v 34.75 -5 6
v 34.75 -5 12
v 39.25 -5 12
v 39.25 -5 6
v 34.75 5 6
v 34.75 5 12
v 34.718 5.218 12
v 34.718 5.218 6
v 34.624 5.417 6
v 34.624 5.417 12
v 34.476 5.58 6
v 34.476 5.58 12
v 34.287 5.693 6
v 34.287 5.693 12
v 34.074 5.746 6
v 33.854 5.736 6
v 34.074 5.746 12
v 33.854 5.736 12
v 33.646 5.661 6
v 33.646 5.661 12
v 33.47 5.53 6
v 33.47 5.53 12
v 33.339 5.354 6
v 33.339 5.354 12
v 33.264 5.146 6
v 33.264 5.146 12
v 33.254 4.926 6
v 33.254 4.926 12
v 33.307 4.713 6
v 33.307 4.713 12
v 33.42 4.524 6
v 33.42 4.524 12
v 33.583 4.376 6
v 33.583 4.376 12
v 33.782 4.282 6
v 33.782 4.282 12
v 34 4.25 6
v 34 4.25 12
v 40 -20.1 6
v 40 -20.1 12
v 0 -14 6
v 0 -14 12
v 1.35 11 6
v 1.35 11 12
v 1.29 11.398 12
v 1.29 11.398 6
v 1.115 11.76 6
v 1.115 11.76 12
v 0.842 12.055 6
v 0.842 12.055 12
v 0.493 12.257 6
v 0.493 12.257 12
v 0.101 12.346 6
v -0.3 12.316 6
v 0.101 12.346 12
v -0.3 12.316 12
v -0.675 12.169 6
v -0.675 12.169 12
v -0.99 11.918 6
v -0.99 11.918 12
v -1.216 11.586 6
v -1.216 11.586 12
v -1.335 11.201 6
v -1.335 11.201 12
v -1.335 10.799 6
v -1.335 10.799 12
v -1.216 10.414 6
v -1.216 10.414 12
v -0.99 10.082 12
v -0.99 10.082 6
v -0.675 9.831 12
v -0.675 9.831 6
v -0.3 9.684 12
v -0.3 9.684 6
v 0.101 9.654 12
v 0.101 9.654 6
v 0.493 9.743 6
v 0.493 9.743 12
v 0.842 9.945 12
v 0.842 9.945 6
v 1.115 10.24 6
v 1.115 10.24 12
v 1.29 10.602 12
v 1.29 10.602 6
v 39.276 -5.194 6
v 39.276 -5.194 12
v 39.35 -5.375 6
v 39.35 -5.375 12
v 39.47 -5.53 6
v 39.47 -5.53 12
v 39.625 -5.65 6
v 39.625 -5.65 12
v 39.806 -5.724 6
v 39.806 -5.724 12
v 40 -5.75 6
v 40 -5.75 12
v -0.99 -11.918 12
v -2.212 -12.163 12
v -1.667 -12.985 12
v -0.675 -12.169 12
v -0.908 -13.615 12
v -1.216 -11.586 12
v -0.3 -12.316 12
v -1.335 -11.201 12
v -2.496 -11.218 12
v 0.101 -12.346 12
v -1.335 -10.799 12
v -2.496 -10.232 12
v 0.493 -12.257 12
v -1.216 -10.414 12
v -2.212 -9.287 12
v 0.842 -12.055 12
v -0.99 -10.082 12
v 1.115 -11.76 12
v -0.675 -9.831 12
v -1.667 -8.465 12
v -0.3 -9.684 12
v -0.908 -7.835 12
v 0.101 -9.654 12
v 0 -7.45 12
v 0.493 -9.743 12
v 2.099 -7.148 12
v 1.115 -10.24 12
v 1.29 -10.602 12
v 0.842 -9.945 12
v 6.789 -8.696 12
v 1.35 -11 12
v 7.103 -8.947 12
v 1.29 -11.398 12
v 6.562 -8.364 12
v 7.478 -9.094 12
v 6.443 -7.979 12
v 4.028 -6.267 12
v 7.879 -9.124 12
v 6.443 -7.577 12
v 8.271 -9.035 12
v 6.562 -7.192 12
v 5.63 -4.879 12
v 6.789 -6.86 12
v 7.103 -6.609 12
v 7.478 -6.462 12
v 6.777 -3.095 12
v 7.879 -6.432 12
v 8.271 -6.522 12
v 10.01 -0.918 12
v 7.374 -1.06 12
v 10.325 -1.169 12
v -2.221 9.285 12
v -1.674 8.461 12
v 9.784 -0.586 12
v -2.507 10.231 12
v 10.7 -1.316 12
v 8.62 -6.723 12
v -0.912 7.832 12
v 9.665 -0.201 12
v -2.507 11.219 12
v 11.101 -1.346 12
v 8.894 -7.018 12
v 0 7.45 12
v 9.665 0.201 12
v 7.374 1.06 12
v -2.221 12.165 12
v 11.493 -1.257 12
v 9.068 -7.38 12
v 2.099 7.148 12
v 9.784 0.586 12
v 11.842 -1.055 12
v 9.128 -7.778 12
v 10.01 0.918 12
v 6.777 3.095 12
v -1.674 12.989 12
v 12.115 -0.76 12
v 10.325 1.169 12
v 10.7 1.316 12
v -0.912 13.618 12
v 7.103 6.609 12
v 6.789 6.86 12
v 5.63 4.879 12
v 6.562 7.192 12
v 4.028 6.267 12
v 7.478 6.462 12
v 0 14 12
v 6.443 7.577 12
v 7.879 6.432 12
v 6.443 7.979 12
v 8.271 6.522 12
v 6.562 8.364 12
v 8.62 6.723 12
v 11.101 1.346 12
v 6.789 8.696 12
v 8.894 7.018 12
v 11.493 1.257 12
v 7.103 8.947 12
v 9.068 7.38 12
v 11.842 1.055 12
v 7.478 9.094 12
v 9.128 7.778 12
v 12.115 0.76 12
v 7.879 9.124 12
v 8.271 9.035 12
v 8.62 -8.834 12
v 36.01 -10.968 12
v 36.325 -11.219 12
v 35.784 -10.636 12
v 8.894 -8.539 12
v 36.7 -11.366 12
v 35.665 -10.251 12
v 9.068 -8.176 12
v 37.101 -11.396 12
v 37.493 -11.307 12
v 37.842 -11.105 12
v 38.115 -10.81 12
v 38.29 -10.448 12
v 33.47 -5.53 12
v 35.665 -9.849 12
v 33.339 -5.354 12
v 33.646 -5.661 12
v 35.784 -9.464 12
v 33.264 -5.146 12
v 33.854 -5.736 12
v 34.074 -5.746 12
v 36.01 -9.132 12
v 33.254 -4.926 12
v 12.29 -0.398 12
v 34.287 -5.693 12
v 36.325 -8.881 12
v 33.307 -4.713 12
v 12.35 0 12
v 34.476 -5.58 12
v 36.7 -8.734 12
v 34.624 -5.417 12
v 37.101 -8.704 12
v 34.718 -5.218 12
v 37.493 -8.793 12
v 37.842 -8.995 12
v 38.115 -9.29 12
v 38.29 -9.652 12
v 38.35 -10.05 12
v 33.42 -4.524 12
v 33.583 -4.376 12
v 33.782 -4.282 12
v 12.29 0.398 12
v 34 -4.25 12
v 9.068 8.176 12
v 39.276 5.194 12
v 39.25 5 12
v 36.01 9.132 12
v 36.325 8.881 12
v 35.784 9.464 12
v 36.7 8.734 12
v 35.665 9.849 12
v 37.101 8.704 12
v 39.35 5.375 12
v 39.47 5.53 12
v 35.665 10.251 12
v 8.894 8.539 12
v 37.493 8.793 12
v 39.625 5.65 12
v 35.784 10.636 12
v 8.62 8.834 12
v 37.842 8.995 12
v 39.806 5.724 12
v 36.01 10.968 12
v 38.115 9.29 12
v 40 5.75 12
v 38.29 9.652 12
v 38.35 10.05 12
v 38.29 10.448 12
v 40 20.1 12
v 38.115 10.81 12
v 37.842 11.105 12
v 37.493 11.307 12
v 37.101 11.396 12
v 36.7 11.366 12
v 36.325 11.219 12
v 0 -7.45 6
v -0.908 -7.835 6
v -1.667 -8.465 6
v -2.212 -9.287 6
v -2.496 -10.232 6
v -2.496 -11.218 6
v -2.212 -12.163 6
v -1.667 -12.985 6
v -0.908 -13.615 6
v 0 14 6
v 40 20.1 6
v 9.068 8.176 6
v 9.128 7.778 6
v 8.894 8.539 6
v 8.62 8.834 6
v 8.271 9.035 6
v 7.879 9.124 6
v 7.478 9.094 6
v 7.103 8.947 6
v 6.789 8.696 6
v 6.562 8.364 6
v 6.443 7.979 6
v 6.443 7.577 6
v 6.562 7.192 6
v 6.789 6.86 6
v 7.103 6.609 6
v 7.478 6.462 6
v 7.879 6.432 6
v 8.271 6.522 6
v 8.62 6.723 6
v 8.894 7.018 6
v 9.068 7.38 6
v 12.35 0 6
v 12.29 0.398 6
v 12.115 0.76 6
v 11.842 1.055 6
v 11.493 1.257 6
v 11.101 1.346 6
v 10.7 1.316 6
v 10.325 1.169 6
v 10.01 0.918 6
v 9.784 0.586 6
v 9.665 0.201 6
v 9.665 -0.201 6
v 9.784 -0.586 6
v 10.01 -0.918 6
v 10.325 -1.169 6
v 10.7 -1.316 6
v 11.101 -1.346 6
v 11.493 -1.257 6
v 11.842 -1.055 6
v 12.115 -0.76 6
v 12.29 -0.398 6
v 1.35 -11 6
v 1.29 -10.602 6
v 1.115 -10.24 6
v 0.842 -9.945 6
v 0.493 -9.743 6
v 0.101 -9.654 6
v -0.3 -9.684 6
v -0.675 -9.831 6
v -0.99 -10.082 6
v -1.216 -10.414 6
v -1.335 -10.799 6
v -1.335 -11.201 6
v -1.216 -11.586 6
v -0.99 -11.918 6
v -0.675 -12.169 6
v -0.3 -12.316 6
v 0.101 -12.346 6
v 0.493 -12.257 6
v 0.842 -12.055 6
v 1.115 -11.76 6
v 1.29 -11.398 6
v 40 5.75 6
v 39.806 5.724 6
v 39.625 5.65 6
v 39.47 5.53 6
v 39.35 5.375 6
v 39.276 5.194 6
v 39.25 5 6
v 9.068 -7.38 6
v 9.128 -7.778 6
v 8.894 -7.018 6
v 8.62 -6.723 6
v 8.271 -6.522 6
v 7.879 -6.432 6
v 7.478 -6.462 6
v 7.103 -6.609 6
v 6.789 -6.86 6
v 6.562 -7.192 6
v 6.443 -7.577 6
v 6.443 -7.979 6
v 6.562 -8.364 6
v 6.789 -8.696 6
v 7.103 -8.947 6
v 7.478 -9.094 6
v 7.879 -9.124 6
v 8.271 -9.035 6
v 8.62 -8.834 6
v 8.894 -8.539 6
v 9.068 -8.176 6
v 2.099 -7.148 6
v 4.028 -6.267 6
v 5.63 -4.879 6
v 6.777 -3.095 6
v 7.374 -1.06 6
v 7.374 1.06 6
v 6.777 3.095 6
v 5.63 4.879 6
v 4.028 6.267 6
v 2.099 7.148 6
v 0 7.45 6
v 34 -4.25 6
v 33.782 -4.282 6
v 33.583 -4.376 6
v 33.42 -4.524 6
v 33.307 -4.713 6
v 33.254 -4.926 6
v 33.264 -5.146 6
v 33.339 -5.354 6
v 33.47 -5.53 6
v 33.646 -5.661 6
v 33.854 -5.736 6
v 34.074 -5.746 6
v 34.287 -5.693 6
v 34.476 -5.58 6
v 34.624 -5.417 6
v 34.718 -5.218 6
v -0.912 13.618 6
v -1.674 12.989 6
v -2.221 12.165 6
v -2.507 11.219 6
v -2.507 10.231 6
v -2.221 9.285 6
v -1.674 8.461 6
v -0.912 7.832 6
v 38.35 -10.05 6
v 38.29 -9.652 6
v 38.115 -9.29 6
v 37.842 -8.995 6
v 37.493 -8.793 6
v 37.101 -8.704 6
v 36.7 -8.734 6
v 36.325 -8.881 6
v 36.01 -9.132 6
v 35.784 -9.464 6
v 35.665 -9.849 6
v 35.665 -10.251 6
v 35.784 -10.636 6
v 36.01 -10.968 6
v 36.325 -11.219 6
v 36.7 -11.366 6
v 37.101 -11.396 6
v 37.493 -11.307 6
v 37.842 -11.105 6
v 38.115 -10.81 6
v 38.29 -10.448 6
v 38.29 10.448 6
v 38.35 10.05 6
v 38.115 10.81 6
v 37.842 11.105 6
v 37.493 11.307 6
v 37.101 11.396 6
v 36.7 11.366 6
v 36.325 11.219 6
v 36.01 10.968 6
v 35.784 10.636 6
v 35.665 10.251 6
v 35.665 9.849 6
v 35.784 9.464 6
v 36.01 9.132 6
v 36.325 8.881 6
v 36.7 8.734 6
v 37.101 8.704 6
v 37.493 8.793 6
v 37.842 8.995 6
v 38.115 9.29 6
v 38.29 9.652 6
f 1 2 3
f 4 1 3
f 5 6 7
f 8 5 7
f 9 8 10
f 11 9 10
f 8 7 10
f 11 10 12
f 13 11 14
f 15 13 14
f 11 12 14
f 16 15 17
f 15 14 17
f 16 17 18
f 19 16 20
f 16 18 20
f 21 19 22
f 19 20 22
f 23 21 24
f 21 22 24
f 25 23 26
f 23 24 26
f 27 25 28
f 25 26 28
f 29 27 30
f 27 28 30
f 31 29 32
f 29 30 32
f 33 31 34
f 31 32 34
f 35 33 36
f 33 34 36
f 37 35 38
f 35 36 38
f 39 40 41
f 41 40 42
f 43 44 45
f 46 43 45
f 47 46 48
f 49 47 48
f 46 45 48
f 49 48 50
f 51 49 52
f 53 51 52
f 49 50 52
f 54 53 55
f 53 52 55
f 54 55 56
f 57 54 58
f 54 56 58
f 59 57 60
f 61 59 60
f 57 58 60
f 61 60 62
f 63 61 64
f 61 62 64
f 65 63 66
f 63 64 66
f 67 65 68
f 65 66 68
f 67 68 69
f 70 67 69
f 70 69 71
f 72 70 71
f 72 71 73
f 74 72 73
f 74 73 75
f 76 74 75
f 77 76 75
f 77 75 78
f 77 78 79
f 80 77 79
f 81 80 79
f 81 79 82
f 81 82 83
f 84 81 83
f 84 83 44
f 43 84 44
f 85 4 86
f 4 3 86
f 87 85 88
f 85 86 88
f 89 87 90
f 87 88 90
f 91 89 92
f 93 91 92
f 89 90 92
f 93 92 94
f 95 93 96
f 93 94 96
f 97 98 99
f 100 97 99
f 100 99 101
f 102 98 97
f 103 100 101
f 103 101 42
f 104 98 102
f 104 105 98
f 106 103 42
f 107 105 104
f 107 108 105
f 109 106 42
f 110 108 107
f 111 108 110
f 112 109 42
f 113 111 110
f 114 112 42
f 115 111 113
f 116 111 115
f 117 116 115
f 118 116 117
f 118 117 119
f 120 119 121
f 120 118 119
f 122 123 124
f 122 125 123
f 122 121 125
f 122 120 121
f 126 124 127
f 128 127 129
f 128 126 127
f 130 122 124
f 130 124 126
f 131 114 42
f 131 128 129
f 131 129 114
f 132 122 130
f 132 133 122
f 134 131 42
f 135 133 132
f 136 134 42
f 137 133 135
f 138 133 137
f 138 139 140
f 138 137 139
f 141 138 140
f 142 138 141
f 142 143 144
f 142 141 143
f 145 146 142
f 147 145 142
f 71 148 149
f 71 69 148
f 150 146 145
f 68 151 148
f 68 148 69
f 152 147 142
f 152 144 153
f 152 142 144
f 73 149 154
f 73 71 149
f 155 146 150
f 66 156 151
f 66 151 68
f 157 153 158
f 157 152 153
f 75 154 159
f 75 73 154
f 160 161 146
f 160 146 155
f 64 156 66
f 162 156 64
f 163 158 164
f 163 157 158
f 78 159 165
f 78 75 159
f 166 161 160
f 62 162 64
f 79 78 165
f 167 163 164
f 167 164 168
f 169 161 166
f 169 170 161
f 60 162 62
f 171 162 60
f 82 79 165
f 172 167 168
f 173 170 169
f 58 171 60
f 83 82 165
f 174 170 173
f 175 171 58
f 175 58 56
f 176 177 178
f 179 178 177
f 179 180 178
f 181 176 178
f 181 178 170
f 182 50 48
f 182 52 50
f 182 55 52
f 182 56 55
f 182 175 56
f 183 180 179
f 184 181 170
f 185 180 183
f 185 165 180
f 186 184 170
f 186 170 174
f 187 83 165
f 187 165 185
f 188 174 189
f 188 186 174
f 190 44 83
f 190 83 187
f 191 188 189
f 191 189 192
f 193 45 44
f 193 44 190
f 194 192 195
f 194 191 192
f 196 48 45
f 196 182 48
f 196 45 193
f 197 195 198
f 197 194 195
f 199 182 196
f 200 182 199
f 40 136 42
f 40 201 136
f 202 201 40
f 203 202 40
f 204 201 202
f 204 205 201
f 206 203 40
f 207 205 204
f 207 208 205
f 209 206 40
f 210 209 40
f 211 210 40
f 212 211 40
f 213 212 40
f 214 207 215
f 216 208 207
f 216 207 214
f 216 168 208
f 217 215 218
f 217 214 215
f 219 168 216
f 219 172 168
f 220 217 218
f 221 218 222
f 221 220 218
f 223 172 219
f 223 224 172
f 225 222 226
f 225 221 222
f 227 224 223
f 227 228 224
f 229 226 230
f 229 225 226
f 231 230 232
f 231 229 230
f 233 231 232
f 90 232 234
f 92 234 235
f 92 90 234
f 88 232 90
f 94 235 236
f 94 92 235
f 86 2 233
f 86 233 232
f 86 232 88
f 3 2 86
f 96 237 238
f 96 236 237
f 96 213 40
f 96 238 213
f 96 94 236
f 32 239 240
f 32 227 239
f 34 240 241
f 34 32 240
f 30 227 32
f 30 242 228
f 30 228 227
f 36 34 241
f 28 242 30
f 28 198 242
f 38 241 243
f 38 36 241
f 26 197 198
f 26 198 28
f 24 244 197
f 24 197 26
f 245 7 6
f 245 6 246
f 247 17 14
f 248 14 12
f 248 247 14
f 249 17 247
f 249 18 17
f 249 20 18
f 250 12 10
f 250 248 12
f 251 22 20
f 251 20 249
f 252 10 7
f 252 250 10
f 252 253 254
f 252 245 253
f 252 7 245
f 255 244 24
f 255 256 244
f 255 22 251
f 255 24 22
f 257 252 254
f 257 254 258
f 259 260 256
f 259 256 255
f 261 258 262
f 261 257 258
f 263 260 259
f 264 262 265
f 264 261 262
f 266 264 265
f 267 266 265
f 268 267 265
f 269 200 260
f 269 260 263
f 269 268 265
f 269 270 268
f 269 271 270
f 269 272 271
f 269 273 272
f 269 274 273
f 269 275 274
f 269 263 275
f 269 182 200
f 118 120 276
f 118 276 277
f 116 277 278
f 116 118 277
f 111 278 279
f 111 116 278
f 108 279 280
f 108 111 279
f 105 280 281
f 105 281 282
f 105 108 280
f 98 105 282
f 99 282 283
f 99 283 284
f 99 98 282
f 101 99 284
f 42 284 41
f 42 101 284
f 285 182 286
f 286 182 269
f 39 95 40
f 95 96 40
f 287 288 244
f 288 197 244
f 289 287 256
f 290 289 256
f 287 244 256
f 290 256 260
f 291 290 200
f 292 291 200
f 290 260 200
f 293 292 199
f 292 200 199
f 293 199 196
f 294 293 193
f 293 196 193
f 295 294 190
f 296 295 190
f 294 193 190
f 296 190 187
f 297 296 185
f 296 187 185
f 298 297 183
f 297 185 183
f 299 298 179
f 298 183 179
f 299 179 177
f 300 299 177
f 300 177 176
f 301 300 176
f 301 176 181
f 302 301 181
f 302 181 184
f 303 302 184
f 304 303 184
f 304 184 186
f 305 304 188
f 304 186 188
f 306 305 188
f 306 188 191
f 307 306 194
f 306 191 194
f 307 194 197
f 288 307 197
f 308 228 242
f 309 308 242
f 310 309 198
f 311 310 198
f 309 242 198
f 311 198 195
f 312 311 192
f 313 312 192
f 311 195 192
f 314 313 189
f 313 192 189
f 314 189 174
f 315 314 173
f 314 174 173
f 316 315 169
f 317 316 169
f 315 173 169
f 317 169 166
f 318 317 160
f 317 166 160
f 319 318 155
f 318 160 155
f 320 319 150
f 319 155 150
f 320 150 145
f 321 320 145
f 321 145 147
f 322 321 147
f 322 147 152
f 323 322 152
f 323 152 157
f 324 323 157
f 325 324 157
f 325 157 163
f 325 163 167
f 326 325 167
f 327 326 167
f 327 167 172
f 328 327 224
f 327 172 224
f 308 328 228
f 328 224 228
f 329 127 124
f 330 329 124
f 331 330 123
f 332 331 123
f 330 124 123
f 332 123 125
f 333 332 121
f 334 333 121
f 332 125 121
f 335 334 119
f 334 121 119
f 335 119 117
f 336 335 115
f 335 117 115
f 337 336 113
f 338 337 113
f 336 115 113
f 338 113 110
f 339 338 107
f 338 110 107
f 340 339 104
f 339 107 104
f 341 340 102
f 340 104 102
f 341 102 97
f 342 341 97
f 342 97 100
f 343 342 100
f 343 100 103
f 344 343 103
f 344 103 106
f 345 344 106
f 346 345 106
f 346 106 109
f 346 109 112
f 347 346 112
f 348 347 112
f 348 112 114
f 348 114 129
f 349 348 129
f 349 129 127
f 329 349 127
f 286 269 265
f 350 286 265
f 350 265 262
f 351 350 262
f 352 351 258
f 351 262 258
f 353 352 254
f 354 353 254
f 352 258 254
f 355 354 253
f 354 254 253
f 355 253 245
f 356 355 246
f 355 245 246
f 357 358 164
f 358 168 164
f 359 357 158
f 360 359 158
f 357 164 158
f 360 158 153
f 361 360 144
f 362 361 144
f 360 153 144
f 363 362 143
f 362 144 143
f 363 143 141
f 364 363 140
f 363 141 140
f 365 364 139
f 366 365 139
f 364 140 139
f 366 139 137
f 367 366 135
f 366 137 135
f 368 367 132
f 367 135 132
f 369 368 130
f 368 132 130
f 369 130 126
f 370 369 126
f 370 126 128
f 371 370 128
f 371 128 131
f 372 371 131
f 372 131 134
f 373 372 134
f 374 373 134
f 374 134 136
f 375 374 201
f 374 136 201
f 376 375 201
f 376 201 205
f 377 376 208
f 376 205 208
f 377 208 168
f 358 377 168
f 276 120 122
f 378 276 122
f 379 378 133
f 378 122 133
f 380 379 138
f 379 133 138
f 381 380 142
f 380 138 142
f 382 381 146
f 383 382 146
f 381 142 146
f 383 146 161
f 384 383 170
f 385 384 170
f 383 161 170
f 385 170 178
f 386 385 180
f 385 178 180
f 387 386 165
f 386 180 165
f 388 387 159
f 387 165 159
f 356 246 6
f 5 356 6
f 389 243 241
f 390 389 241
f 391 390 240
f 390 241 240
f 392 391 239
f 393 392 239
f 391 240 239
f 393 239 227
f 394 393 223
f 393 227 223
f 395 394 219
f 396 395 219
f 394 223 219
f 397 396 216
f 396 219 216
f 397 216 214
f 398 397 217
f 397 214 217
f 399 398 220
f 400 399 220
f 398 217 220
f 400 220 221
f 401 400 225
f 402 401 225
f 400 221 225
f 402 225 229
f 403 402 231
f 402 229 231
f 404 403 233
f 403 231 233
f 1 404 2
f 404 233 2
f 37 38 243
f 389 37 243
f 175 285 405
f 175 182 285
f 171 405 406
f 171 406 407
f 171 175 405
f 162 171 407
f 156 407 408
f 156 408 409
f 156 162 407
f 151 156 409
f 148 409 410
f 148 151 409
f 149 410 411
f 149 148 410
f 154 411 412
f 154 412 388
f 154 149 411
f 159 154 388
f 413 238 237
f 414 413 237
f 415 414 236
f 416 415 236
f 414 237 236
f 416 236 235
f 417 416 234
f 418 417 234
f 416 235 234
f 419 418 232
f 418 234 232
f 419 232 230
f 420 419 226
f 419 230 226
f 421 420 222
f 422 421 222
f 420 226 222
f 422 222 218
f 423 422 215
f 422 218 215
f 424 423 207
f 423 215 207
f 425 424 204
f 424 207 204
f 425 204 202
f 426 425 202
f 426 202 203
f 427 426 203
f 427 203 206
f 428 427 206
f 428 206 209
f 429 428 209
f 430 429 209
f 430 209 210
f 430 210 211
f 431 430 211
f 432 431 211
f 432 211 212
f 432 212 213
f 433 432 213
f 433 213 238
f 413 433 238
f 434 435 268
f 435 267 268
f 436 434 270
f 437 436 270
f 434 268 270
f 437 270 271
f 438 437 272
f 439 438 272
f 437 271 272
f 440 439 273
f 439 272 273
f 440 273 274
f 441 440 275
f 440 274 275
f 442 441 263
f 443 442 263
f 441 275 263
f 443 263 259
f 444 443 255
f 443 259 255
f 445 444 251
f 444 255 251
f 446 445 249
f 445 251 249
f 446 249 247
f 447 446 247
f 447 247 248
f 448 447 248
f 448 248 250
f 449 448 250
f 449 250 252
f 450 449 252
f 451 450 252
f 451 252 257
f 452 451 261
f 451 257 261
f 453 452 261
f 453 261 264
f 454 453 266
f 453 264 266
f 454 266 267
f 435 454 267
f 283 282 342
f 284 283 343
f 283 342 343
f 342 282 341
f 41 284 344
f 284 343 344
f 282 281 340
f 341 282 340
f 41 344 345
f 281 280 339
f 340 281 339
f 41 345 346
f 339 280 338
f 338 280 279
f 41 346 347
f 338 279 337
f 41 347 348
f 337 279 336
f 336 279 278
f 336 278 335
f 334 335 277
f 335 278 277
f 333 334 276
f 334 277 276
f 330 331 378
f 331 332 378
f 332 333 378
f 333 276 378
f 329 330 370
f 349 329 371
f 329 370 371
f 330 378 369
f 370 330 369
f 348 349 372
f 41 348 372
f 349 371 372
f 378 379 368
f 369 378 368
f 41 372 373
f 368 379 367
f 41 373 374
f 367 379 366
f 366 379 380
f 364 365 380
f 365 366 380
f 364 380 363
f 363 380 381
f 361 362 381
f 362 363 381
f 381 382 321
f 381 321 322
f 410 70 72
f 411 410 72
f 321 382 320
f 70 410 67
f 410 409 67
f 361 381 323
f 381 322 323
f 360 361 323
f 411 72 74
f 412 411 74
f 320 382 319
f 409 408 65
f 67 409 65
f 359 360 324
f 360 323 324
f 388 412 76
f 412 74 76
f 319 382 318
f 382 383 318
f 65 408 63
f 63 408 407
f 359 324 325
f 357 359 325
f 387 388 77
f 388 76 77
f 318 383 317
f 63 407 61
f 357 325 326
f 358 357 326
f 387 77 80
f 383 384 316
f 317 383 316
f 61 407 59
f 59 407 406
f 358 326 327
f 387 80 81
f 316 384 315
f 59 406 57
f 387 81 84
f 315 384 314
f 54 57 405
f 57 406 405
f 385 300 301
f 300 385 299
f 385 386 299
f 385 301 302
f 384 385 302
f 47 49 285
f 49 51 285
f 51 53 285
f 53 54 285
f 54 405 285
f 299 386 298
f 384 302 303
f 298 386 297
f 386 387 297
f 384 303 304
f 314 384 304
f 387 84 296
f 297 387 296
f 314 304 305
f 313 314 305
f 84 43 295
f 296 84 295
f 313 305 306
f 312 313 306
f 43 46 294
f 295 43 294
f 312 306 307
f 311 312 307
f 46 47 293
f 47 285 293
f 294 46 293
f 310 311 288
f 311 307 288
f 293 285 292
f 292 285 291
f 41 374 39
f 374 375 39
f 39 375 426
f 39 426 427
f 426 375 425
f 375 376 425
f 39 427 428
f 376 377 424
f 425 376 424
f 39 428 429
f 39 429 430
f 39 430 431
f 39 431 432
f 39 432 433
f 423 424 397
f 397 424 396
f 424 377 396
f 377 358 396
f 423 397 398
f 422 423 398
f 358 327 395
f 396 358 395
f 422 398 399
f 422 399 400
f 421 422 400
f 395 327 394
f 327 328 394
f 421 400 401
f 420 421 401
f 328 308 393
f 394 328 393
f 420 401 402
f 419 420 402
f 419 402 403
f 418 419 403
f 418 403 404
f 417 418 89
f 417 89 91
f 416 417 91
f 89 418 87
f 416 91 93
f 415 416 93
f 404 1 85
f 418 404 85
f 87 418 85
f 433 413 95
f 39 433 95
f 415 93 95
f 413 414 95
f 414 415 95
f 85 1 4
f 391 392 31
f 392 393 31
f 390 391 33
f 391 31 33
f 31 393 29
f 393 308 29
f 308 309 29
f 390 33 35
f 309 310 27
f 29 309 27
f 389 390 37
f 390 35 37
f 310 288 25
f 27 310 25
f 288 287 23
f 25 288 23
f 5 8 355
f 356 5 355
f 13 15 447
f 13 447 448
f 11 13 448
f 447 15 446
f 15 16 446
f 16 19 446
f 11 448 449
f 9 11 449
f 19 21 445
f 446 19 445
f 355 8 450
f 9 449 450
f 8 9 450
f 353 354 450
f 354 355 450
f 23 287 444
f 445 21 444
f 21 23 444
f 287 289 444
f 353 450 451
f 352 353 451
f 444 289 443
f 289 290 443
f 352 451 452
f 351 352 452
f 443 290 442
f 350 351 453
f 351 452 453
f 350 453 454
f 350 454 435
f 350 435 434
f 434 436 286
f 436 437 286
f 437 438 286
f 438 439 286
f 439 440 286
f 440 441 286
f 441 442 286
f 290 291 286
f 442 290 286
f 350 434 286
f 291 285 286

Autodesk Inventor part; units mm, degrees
ref_plane "YZ Plane" through (0, 0, 0) normal (1, 0, 0) x (0, 1, 0)
ref_plane "XZ Plane" through (0, 0, 0) normal (0, 1, 0) x (-1, 0, 0)
ref_plane "XY Plane" through (0, 0, 0) normal (0, 0, 1) x (1, 0, 0)
ref_plane "작업 평면1" through (0, 0, 0) normal (0, 0, 1) x (1, 0, 0)
ref_plane "작업 평면3" through (0, 0, 6) normal (0, 0, 1) x (1, 0, 0)
ref_plane "작업 평면4" through (40, -20.1, 6) normal (1, 0, 0) x (0, 0, -1)
ref_plane "작업 평면2" through (0, 0, 6) normal (0, 0, 1) x (1, 0, 0)
ref_plane "작업 평면6" through (30, -20.1, 6) normal (1, 0, 0) x (0, 0, -1)
ref_plane "작업 평면5" through (0, 0, 12) normal (0, 0, 1) x (1, 0, 0)
sketch "스케치6" plane through (0, 0, 12) normal (0, 0, 1) x (1, 0, 0)
  arc A0 (0, -7.45) -> (0, 7.45) centre (0, 0) ccw
  arc A1 (0, -7.45) -> (0, -14) centre (0.8514, -10.725) ccw
  line L0 (40, -20.1) -> (0, -14)
  line L1 (40, 20.1) -> (40, -20.1)
  line L2 (0, 14) -> (40, 20.1)
  arc A2 (0, 14) -> (0, 7.45) centre (0.8364, 10.725) ccw
  circle A3 centre (0, -11) radius 1.35
  circle A4 centre (7.7782, -7.7782) radius 1.35
  circle A5 centre (11, 0) radius 1.35
  circle A6 centre (7.7782, 7.7782) radius 1.35
  circle A7 centre (0, 11) radius 1.35
extrude "돌출6" add sketch "스케치6" against normal blind 6
sketch "스케치9" plane through (0, 0, 12) normal (0, 0, 1) x (1, 0, 0)
  arc A0 (0, -7.45) -> (0, 7.45) centre (0, 0) ccw projected
  arc A1 (0, -7.45) -> (0, -14) centre (0.8514, -10.725) ccw projected
  line L0 (0, -14) -> (40, -20.1) projected
  line L1 (40, -20.1) -> (40, 20.1) projected
  line L2 (40, 20.1) -> (0, 14) projected
  arc A2 (0, 14) -> (0, 7.45) centre (0.8364, 10.725) ccw projected
  circle A3 centre (11, 0) radius 1.35 projected
  circle A4 centre (0, 11) radius 1.35 projected
  circle A5 centre (7.7782, 7.7782) radius 1.35 projected
  circle A6 centre (7.7782, -7.7782) radius 1.35 projected
  circle A7 centre (0, -11) radius 1.35 projected
  line L3 (40, 20.1) -> (40, -20.1)
  line L4 (40, -20.1) -> (34, -20.1)
  line L5 (34, -20.1) -> (34, 20.1)
  line L6 (34, 20.1) -> (40, 20.1)
  line L7 (40, 20.1) -> (40, 10.05)
  line L8 (40, 10.05) -> (40, -10.05)
  circle A8 centre (37, 10.05) radius 1.35
  circle A9 centre (37, -10.05) radius 1.35
  dimension "d41" = 6
  dimension "d42" = 10.05
  dimension "d43" = 20.1
  dimension "d44" = 2.7
  dimension "d45" = 2.7
extrude "돌출8" cut sketch "스케치9" against normal blind 6 contours A8 | A9
sketch "스케치10" plane through (0, 0, 12) normal (0, 0, 1) x (1, 0, 0)
  circle A0 centre (37, -10.05) radius 1.35 projected
  circle A1 centre (37, 10.05) radius 1.35 projected
  arc A2 (0, -7.45) -> (0, 7.45) centre (0, 0) ccw projected
  arc A3 (0, -7.45) -> (0, -14) centre (0.8514, -10.725) ccw projected
  line L0 (0, -14) -> (40, -20.1) projected
  line L1 (40, -20.1) -> (40, 20.1) projected
  line L2 (40, 20.1) -> (0, 14) projected
  arc A4 (0, 14) -> (0, 7.45) centre (0.8364, 10.725) ccw projected
  circle A5 centre (11, 0) radius 1.35 projected
  circle A6 centre (0, 11) radius 1.35 projected
  circle A7 centre (7.7782, 7.7782) radius 1.35 projected
  circle A8 centre (7.7782, -7.7782) radius 1.35 projected
  circle A9 centre (0, -11) radius 1.35 projected
  line L3 (34, -5) -> (40, -5)
  line L4 (40, -5) -> (40, 5)
  line L5 (40, 5) -> (34, 5)
  line L6 (34, 5) -> (34, -5)
  line L7 (34, -5) -> (40, 5) construction
  line L8 (40, -5) -> (34, 5) construction
  circle A10 centre (40, 5) radius 0.75
  circle A11 centre (34, 5) radius 0.75
  circle A12 centre (34, -5) radius 0.75
  circle A13 centre (40, -5) radius 0.75
  point P0 (37, 0)
  point P1 (39.25, -5)
  point P2 (40, -5.75)
  point P3 (34, -4.25)
  point P4 (34.75, -5)
  point P5 (34.75, 5)
  point P6 (34, 4.25)
  point P7 (40, 5.75)
  point P8 (39.25, 5)
  dimension "d48" = 10
  dimension "d51" = 1.5
  dimension "d52" = 1.5
  dimension "d53" = 1.5
  dimension "d54" = 1.5
extrude "돌출9" cut sketch "스케치10" against normal blind 10 contours A13 L3 L1 | L1 L5 A10 | L3 A13 L1 | L3 A12 L6 A11 L5 A10 L1 A13 | L1 A10 L5 | A12 L6 L3 | L3 L6 A12 | A11 L6 L5 | L5 L6 A11
properties part number "feet_holder1" material "PMMA 플라스틱"
